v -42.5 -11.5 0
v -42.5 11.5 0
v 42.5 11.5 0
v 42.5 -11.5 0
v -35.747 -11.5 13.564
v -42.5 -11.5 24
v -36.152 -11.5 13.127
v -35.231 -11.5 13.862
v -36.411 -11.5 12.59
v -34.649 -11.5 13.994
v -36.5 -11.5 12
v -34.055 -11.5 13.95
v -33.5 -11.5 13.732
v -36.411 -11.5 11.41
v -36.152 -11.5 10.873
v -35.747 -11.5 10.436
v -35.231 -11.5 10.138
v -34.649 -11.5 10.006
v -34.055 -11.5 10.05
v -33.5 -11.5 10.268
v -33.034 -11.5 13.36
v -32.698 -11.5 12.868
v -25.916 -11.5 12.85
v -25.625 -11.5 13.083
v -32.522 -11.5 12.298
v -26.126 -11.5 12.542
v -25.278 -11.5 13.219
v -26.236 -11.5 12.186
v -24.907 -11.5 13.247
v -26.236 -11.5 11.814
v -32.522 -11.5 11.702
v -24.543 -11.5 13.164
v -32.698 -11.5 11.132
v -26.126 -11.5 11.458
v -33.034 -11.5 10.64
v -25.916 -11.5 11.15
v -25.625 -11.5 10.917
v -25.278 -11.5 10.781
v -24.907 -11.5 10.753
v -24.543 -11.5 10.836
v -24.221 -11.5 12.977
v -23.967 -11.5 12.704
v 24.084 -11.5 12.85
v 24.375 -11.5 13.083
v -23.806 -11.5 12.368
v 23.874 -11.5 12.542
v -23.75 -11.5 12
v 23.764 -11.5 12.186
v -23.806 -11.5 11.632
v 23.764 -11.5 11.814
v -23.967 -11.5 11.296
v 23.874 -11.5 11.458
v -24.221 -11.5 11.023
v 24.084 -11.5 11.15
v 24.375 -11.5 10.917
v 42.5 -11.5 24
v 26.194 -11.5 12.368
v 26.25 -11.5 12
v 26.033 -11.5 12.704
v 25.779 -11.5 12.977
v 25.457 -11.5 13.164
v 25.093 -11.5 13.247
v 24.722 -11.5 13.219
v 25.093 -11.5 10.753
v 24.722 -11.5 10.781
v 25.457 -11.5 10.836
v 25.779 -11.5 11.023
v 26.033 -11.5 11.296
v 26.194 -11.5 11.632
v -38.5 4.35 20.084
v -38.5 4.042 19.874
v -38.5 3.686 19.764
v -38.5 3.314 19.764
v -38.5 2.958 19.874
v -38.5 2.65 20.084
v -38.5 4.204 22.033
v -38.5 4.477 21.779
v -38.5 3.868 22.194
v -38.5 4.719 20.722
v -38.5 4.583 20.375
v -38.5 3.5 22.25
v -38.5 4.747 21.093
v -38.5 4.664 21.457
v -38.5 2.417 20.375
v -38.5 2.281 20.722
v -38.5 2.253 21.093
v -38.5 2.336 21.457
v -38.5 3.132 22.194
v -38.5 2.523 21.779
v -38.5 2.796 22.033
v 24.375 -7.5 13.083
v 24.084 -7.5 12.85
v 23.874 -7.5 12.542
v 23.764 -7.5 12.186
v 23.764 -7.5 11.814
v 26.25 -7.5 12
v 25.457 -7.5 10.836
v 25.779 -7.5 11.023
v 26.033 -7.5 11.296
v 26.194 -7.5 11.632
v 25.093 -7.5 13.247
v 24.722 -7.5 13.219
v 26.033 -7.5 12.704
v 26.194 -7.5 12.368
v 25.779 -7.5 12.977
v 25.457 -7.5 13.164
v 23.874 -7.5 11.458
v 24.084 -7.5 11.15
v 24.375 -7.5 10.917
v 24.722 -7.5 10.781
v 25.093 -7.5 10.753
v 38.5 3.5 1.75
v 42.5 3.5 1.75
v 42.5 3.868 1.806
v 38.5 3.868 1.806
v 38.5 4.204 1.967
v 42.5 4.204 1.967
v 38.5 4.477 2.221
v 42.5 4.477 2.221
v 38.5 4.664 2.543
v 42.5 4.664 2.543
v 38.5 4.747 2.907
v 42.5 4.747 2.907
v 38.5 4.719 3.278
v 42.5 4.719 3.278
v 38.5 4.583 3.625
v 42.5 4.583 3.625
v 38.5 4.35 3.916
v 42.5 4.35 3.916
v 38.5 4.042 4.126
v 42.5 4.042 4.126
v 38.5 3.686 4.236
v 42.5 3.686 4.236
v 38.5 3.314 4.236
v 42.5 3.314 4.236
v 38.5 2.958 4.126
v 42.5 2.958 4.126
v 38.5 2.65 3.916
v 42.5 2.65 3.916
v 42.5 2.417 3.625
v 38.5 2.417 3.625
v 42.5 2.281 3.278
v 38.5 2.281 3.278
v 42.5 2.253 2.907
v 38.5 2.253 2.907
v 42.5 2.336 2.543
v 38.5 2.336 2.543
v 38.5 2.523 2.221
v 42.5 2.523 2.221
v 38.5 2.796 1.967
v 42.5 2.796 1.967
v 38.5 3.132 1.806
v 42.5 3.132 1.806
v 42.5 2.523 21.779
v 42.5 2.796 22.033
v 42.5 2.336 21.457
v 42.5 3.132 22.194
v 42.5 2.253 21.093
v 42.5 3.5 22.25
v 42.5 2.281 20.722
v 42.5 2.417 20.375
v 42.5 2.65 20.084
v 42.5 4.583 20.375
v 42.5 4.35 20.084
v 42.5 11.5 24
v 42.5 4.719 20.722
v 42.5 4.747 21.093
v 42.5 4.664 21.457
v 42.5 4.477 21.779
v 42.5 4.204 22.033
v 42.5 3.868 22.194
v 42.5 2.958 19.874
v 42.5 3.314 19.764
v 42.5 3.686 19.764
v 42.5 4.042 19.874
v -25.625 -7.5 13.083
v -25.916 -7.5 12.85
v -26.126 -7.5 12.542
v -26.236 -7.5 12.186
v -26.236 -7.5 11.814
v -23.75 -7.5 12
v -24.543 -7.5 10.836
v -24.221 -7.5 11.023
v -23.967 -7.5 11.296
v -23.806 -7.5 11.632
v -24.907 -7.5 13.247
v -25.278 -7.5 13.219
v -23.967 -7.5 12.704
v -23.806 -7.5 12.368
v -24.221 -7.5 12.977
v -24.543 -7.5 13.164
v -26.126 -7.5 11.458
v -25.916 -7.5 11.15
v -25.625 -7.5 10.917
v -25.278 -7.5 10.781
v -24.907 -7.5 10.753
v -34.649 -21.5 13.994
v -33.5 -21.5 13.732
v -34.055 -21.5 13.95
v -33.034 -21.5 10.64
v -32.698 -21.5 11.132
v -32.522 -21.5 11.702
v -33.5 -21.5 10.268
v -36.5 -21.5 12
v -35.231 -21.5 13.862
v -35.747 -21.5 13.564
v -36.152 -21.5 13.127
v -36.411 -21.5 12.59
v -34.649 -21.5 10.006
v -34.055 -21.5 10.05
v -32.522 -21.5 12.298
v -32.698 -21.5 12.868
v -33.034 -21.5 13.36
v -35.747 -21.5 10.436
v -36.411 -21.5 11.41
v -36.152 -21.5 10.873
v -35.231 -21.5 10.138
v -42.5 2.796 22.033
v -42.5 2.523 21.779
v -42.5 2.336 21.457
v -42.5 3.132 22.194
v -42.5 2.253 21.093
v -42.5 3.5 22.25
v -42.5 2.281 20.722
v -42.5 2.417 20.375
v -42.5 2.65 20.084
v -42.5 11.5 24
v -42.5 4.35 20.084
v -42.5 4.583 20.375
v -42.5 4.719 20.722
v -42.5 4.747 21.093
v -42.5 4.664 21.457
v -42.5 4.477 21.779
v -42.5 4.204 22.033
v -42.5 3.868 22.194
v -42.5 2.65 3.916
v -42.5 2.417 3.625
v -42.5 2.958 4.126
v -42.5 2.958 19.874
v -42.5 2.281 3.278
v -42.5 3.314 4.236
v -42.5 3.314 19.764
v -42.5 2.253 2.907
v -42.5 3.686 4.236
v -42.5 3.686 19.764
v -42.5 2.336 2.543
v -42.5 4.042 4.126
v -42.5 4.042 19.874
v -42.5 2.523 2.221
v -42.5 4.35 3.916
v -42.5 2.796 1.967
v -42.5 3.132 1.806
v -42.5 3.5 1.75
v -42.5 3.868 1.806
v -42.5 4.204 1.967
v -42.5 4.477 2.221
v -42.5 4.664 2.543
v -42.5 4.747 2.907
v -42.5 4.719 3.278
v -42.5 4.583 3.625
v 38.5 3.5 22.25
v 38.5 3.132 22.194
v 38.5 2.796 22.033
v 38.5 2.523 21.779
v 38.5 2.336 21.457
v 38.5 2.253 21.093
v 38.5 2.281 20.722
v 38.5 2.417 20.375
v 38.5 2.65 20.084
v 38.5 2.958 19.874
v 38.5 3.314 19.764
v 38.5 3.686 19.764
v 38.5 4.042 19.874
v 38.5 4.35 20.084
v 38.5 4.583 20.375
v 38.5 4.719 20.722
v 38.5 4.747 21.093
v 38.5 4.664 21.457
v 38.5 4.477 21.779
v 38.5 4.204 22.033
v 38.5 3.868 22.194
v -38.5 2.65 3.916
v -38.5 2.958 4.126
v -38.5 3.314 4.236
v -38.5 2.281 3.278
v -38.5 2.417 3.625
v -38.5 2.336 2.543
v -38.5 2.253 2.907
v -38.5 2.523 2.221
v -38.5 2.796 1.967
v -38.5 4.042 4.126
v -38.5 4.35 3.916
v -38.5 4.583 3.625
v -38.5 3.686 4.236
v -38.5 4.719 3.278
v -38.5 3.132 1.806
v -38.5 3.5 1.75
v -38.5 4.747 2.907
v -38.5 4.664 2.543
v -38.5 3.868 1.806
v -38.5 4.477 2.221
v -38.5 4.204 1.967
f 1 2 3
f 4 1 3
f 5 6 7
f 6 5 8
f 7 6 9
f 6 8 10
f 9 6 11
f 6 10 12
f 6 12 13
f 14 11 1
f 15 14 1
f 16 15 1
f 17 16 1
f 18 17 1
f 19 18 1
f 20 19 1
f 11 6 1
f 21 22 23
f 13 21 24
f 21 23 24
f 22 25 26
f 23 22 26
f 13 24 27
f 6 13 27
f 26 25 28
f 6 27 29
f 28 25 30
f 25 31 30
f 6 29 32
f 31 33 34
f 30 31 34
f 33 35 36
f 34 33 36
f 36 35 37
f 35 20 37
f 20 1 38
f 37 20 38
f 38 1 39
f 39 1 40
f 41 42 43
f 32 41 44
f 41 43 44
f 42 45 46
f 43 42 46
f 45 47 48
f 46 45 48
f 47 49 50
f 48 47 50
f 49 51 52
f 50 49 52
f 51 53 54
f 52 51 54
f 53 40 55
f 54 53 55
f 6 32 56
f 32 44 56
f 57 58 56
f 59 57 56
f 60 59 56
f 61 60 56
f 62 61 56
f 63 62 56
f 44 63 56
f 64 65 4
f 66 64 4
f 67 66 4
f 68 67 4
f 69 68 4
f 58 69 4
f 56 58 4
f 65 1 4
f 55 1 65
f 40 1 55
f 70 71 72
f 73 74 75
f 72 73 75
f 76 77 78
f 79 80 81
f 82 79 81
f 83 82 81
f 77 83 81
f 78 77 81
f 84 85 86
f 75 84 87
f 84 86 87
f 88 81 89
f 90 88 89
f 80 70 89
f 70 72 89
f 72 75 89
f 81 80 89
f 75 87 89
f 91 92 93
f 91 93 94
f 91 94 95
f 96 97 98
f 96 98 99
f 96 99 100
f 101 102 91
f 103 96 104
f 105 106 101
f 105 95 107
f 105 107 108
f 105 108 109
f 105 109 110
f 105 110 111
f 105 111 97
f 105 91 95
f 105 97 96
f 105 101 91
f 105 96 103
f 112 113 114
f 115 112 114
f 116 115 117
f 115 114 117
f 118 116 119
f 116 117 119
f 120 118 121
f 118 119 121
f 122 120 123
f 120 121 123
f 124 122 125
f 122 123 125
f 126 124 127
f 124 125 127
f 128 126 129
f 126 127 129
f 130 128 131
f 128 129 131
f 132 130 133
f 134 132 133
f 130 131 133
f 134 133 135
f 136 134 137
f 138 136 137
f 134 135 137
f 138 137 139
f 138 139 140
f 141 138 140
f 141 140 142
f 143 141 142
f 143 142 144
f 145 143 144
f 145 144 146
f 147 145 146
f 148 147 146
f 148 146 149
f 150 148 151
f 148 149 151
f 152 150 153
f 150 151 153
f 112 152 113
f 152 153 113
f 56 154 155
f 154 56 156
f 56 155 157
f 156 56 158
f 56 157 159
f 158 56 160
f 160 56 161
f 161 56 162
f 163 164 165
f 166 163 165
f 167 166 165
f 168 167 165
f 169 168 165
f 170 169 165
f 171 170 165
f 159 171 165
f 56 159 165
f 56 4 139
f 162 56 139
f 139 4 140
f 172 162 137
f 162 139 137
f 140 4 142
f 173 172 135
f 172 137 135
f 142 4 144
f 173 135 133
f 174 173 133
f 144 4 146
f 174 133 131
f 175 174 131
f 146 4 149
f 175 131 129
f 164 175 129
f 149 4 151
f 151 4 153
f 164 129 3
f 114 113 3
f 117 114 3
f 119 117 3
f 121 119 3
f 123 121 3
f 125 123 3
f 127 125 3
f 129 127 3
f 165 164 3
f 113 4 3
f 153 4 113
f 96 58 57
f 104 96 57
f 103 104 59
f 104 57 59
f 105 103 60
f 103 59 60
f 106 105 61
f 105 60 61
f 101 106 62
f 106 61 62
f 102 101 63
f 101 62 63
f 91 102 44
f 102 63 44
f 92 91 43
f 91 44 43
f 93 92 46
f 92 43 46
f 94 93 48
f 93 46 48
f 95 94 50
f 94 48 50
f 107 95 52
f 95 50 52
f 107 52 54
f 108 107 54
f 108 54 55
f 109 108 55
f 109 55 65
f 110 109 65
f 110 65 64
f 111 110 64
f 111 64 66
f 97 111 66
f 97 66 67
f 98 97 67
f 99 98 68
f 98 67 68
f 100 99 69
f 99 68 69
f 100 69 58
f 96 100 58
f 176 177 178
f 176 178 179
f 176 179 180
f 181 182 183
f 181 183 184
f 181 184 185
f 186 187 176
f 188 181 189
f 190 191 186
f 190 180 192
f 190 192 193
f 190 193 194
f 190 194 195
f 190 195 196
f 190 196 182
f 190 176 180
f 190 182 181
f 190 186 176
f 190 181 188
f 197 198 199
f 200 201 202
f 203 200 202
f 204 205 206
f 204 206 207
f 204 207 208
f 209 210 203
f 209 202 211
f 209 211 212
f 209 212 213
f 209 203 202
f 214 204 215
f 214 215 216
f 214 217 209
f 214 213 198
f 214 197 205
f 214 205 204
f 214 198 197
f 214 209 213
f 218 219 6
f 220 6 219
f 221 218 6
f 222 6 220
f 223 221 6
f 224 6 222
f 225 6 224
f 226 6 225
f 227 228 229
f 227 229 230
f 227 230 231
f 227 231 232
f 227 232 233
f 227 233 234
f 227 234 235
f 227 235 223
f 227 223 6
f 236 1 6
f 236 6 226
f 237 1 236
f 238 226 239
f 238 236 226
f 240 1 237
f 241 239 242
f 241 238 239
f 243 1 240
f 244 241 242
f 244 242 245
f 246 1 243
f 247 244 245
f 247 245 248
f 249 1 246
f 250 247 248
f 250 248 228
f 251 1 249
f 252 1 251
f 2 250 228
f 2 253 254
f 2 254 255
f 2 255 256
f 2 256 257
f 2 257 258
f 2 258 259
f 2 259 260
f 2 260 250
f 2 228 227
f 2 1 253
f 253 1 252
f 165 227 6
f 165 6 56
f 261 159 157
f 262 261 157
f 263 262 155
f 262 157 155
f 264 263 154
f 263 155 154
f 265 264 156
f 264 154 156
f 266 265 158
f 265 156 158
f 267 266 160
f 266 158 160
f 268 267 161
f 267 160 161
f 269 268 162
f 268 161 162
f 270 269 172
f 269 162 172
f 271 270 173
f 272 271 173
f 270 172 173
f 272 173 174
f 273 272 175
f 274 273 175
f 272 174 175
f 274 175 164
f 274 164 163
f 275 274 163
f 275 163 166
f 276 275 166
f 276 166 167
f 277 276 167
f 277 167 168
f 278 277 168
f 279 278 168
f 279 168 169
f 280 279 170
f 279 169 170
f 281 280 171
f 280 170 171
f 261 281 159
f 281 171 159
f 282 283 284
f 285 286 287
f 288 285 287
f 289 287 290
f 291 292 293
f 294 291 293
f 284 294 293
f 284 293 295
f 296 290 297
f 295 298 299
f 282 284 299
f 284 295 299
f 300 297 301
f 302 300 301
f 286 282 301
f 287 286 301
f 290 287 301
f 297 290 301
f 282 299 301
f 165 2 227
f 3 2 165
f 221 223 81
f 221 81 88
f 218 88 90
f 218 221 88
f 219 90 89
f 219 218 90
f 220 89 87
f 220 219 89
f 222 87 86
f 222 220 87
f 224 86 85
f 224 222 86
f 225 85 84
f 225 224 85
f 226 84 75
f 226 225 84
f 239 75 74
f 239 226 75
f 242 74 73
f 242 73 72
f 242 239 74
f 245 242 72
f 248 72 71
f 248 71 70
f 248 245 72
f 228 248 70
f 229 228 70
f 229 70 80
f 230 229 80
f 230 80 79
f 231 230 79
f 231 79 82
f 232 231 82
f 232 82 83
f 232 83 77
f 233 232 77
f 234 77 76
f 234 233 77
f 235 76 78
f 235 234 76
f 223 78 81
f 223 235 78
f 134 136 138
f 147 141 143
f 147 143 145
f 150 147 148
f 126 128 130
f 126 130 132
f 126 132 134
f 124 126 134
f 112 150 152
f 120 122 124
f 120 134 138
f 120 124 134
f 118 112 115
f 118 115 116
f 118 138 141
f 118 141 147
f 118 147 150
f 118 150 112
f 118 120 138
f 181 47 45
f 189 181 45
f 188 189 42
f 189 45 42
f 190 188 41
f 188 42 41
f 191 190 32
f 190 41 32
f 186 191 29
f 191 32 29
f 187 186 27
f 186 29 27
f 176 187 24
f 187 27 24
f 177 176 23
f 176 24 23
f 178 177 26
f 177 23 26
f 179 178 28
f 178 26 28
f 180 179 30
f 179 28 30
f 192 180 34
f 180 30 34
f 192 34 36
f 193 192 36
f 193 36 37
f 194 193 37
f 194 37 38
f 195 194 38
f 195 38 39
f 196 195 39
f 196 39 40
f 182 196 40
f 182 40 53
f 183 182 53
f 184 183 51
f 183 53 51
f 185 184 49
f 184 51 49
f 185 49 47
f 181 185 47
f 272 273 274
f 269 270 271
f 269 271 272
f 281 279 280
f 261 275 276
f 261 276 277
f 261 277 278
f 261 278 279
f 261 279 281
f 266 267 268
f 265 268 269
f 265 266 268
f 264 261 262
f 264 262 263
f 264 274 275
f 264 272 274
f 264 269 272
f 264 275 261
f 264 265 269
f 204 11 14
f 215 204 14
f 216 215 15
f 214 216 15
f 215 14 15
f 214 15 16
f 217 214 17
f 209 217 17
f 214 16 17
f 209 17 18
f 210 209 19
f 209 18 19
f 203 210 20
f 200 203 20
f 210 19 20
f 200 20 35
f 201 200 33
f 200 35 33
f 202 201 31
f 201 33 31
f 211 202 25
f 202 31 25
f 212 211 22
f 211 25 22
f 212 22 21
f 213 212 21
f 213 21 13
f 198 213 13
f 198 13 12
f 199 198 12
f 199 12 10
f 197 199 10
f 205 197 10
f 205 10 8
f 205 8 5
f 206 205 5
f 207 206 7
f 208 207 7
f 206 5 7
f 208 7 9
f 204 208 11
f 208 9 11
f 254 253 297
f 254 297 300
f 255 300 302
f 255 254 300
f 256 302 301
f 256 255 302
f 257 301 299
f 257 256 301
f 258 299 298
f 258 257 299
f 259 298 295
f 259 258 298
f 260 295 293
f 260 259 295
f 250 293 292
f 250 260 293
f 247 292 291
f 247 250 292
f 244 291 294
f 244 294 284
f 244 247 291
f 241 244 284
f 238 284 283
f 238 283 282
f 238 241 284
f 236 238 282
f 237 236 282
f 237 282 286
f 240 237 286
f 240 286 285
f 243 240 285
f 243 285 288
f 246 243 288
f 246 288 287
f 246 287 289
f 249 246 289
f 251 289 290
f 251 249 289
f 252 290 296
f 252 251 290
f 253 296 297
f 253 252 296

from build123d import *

# Parameters (mm, degrees)
SKETCH1_W           = 85
SKETCH1_H           = 23
BOSS_EXTRUDE1_DEPTH = 24
SKETCH3_R           = 1.25
CUT_EXTRUDE1_DEPTH  = 4
SKETCH4_R           = 1.25
CUT_EXTRUDE2_DEPTH  = 4
SKETCH5_R           = 2
BOSS_EXTRUDE3_DEPTH = 10


with BuildPart() as part:
    # Sketch1 → Boss-Extrude1 (new body)
    with BuildSketch(Plane.XY):
        Rectangle(SKETCH1_W, SKETCH1_H)
    extrude(amount=BOSS_EXTRUDE1_DEPTH)

    # Sketch3 → Cut-Extrude1 (cut)
    with BuildSketch(Plane.XZ.offset(11.5)):
        with Locations((-25, 12)):
            Circle(SKETCH3_R)
        with Locations((25, 12)):
            Circle(SKETCH3_R)
    extrude(amount=-CUT_EXTRUDE1_DEPTH, mode=Mode.SUBTRACT)

    # Sketch4 → Cut-Extrude2 (cut)
    with BuildSketch(Plane(origin=(42.5, 0, 0), x_dir=(0, 0, -1), z_dir=(1, 0, 0))):
        with Locations((-3, 3.5)):
            Circle(SKETCH4_R)
        with Locations(Location((-21, 3.5, 0), (0, 0, 180))):
            Circle(SKETCH4_R)
    cut_extrude2 = extrude(amount=-CUT_EXTRUDE2_DEPTH, mode=Mode.SUBTRACT)

    # Mirror1: Cut-Extrude2 across plane
    add(cut_extrude2.mirror(Plane(origin=(0, 0, 0), x_dir=(0, 0, 1), z_dir=(1, 0, 0))), mode=Mode.SUBTRACT)

    # Sketch5 → Boss-Extrude3 (add)
    with BuildSketch(Plane.XZ.offset(11.5)):
        with Locations(Location((-34.5, 12, 0), (0, 0, 180))):
            Circle(SKETCH5_R)
    extrude(amount=BOSS_EXTRUDE3_DEPTH)


solid = part.part
